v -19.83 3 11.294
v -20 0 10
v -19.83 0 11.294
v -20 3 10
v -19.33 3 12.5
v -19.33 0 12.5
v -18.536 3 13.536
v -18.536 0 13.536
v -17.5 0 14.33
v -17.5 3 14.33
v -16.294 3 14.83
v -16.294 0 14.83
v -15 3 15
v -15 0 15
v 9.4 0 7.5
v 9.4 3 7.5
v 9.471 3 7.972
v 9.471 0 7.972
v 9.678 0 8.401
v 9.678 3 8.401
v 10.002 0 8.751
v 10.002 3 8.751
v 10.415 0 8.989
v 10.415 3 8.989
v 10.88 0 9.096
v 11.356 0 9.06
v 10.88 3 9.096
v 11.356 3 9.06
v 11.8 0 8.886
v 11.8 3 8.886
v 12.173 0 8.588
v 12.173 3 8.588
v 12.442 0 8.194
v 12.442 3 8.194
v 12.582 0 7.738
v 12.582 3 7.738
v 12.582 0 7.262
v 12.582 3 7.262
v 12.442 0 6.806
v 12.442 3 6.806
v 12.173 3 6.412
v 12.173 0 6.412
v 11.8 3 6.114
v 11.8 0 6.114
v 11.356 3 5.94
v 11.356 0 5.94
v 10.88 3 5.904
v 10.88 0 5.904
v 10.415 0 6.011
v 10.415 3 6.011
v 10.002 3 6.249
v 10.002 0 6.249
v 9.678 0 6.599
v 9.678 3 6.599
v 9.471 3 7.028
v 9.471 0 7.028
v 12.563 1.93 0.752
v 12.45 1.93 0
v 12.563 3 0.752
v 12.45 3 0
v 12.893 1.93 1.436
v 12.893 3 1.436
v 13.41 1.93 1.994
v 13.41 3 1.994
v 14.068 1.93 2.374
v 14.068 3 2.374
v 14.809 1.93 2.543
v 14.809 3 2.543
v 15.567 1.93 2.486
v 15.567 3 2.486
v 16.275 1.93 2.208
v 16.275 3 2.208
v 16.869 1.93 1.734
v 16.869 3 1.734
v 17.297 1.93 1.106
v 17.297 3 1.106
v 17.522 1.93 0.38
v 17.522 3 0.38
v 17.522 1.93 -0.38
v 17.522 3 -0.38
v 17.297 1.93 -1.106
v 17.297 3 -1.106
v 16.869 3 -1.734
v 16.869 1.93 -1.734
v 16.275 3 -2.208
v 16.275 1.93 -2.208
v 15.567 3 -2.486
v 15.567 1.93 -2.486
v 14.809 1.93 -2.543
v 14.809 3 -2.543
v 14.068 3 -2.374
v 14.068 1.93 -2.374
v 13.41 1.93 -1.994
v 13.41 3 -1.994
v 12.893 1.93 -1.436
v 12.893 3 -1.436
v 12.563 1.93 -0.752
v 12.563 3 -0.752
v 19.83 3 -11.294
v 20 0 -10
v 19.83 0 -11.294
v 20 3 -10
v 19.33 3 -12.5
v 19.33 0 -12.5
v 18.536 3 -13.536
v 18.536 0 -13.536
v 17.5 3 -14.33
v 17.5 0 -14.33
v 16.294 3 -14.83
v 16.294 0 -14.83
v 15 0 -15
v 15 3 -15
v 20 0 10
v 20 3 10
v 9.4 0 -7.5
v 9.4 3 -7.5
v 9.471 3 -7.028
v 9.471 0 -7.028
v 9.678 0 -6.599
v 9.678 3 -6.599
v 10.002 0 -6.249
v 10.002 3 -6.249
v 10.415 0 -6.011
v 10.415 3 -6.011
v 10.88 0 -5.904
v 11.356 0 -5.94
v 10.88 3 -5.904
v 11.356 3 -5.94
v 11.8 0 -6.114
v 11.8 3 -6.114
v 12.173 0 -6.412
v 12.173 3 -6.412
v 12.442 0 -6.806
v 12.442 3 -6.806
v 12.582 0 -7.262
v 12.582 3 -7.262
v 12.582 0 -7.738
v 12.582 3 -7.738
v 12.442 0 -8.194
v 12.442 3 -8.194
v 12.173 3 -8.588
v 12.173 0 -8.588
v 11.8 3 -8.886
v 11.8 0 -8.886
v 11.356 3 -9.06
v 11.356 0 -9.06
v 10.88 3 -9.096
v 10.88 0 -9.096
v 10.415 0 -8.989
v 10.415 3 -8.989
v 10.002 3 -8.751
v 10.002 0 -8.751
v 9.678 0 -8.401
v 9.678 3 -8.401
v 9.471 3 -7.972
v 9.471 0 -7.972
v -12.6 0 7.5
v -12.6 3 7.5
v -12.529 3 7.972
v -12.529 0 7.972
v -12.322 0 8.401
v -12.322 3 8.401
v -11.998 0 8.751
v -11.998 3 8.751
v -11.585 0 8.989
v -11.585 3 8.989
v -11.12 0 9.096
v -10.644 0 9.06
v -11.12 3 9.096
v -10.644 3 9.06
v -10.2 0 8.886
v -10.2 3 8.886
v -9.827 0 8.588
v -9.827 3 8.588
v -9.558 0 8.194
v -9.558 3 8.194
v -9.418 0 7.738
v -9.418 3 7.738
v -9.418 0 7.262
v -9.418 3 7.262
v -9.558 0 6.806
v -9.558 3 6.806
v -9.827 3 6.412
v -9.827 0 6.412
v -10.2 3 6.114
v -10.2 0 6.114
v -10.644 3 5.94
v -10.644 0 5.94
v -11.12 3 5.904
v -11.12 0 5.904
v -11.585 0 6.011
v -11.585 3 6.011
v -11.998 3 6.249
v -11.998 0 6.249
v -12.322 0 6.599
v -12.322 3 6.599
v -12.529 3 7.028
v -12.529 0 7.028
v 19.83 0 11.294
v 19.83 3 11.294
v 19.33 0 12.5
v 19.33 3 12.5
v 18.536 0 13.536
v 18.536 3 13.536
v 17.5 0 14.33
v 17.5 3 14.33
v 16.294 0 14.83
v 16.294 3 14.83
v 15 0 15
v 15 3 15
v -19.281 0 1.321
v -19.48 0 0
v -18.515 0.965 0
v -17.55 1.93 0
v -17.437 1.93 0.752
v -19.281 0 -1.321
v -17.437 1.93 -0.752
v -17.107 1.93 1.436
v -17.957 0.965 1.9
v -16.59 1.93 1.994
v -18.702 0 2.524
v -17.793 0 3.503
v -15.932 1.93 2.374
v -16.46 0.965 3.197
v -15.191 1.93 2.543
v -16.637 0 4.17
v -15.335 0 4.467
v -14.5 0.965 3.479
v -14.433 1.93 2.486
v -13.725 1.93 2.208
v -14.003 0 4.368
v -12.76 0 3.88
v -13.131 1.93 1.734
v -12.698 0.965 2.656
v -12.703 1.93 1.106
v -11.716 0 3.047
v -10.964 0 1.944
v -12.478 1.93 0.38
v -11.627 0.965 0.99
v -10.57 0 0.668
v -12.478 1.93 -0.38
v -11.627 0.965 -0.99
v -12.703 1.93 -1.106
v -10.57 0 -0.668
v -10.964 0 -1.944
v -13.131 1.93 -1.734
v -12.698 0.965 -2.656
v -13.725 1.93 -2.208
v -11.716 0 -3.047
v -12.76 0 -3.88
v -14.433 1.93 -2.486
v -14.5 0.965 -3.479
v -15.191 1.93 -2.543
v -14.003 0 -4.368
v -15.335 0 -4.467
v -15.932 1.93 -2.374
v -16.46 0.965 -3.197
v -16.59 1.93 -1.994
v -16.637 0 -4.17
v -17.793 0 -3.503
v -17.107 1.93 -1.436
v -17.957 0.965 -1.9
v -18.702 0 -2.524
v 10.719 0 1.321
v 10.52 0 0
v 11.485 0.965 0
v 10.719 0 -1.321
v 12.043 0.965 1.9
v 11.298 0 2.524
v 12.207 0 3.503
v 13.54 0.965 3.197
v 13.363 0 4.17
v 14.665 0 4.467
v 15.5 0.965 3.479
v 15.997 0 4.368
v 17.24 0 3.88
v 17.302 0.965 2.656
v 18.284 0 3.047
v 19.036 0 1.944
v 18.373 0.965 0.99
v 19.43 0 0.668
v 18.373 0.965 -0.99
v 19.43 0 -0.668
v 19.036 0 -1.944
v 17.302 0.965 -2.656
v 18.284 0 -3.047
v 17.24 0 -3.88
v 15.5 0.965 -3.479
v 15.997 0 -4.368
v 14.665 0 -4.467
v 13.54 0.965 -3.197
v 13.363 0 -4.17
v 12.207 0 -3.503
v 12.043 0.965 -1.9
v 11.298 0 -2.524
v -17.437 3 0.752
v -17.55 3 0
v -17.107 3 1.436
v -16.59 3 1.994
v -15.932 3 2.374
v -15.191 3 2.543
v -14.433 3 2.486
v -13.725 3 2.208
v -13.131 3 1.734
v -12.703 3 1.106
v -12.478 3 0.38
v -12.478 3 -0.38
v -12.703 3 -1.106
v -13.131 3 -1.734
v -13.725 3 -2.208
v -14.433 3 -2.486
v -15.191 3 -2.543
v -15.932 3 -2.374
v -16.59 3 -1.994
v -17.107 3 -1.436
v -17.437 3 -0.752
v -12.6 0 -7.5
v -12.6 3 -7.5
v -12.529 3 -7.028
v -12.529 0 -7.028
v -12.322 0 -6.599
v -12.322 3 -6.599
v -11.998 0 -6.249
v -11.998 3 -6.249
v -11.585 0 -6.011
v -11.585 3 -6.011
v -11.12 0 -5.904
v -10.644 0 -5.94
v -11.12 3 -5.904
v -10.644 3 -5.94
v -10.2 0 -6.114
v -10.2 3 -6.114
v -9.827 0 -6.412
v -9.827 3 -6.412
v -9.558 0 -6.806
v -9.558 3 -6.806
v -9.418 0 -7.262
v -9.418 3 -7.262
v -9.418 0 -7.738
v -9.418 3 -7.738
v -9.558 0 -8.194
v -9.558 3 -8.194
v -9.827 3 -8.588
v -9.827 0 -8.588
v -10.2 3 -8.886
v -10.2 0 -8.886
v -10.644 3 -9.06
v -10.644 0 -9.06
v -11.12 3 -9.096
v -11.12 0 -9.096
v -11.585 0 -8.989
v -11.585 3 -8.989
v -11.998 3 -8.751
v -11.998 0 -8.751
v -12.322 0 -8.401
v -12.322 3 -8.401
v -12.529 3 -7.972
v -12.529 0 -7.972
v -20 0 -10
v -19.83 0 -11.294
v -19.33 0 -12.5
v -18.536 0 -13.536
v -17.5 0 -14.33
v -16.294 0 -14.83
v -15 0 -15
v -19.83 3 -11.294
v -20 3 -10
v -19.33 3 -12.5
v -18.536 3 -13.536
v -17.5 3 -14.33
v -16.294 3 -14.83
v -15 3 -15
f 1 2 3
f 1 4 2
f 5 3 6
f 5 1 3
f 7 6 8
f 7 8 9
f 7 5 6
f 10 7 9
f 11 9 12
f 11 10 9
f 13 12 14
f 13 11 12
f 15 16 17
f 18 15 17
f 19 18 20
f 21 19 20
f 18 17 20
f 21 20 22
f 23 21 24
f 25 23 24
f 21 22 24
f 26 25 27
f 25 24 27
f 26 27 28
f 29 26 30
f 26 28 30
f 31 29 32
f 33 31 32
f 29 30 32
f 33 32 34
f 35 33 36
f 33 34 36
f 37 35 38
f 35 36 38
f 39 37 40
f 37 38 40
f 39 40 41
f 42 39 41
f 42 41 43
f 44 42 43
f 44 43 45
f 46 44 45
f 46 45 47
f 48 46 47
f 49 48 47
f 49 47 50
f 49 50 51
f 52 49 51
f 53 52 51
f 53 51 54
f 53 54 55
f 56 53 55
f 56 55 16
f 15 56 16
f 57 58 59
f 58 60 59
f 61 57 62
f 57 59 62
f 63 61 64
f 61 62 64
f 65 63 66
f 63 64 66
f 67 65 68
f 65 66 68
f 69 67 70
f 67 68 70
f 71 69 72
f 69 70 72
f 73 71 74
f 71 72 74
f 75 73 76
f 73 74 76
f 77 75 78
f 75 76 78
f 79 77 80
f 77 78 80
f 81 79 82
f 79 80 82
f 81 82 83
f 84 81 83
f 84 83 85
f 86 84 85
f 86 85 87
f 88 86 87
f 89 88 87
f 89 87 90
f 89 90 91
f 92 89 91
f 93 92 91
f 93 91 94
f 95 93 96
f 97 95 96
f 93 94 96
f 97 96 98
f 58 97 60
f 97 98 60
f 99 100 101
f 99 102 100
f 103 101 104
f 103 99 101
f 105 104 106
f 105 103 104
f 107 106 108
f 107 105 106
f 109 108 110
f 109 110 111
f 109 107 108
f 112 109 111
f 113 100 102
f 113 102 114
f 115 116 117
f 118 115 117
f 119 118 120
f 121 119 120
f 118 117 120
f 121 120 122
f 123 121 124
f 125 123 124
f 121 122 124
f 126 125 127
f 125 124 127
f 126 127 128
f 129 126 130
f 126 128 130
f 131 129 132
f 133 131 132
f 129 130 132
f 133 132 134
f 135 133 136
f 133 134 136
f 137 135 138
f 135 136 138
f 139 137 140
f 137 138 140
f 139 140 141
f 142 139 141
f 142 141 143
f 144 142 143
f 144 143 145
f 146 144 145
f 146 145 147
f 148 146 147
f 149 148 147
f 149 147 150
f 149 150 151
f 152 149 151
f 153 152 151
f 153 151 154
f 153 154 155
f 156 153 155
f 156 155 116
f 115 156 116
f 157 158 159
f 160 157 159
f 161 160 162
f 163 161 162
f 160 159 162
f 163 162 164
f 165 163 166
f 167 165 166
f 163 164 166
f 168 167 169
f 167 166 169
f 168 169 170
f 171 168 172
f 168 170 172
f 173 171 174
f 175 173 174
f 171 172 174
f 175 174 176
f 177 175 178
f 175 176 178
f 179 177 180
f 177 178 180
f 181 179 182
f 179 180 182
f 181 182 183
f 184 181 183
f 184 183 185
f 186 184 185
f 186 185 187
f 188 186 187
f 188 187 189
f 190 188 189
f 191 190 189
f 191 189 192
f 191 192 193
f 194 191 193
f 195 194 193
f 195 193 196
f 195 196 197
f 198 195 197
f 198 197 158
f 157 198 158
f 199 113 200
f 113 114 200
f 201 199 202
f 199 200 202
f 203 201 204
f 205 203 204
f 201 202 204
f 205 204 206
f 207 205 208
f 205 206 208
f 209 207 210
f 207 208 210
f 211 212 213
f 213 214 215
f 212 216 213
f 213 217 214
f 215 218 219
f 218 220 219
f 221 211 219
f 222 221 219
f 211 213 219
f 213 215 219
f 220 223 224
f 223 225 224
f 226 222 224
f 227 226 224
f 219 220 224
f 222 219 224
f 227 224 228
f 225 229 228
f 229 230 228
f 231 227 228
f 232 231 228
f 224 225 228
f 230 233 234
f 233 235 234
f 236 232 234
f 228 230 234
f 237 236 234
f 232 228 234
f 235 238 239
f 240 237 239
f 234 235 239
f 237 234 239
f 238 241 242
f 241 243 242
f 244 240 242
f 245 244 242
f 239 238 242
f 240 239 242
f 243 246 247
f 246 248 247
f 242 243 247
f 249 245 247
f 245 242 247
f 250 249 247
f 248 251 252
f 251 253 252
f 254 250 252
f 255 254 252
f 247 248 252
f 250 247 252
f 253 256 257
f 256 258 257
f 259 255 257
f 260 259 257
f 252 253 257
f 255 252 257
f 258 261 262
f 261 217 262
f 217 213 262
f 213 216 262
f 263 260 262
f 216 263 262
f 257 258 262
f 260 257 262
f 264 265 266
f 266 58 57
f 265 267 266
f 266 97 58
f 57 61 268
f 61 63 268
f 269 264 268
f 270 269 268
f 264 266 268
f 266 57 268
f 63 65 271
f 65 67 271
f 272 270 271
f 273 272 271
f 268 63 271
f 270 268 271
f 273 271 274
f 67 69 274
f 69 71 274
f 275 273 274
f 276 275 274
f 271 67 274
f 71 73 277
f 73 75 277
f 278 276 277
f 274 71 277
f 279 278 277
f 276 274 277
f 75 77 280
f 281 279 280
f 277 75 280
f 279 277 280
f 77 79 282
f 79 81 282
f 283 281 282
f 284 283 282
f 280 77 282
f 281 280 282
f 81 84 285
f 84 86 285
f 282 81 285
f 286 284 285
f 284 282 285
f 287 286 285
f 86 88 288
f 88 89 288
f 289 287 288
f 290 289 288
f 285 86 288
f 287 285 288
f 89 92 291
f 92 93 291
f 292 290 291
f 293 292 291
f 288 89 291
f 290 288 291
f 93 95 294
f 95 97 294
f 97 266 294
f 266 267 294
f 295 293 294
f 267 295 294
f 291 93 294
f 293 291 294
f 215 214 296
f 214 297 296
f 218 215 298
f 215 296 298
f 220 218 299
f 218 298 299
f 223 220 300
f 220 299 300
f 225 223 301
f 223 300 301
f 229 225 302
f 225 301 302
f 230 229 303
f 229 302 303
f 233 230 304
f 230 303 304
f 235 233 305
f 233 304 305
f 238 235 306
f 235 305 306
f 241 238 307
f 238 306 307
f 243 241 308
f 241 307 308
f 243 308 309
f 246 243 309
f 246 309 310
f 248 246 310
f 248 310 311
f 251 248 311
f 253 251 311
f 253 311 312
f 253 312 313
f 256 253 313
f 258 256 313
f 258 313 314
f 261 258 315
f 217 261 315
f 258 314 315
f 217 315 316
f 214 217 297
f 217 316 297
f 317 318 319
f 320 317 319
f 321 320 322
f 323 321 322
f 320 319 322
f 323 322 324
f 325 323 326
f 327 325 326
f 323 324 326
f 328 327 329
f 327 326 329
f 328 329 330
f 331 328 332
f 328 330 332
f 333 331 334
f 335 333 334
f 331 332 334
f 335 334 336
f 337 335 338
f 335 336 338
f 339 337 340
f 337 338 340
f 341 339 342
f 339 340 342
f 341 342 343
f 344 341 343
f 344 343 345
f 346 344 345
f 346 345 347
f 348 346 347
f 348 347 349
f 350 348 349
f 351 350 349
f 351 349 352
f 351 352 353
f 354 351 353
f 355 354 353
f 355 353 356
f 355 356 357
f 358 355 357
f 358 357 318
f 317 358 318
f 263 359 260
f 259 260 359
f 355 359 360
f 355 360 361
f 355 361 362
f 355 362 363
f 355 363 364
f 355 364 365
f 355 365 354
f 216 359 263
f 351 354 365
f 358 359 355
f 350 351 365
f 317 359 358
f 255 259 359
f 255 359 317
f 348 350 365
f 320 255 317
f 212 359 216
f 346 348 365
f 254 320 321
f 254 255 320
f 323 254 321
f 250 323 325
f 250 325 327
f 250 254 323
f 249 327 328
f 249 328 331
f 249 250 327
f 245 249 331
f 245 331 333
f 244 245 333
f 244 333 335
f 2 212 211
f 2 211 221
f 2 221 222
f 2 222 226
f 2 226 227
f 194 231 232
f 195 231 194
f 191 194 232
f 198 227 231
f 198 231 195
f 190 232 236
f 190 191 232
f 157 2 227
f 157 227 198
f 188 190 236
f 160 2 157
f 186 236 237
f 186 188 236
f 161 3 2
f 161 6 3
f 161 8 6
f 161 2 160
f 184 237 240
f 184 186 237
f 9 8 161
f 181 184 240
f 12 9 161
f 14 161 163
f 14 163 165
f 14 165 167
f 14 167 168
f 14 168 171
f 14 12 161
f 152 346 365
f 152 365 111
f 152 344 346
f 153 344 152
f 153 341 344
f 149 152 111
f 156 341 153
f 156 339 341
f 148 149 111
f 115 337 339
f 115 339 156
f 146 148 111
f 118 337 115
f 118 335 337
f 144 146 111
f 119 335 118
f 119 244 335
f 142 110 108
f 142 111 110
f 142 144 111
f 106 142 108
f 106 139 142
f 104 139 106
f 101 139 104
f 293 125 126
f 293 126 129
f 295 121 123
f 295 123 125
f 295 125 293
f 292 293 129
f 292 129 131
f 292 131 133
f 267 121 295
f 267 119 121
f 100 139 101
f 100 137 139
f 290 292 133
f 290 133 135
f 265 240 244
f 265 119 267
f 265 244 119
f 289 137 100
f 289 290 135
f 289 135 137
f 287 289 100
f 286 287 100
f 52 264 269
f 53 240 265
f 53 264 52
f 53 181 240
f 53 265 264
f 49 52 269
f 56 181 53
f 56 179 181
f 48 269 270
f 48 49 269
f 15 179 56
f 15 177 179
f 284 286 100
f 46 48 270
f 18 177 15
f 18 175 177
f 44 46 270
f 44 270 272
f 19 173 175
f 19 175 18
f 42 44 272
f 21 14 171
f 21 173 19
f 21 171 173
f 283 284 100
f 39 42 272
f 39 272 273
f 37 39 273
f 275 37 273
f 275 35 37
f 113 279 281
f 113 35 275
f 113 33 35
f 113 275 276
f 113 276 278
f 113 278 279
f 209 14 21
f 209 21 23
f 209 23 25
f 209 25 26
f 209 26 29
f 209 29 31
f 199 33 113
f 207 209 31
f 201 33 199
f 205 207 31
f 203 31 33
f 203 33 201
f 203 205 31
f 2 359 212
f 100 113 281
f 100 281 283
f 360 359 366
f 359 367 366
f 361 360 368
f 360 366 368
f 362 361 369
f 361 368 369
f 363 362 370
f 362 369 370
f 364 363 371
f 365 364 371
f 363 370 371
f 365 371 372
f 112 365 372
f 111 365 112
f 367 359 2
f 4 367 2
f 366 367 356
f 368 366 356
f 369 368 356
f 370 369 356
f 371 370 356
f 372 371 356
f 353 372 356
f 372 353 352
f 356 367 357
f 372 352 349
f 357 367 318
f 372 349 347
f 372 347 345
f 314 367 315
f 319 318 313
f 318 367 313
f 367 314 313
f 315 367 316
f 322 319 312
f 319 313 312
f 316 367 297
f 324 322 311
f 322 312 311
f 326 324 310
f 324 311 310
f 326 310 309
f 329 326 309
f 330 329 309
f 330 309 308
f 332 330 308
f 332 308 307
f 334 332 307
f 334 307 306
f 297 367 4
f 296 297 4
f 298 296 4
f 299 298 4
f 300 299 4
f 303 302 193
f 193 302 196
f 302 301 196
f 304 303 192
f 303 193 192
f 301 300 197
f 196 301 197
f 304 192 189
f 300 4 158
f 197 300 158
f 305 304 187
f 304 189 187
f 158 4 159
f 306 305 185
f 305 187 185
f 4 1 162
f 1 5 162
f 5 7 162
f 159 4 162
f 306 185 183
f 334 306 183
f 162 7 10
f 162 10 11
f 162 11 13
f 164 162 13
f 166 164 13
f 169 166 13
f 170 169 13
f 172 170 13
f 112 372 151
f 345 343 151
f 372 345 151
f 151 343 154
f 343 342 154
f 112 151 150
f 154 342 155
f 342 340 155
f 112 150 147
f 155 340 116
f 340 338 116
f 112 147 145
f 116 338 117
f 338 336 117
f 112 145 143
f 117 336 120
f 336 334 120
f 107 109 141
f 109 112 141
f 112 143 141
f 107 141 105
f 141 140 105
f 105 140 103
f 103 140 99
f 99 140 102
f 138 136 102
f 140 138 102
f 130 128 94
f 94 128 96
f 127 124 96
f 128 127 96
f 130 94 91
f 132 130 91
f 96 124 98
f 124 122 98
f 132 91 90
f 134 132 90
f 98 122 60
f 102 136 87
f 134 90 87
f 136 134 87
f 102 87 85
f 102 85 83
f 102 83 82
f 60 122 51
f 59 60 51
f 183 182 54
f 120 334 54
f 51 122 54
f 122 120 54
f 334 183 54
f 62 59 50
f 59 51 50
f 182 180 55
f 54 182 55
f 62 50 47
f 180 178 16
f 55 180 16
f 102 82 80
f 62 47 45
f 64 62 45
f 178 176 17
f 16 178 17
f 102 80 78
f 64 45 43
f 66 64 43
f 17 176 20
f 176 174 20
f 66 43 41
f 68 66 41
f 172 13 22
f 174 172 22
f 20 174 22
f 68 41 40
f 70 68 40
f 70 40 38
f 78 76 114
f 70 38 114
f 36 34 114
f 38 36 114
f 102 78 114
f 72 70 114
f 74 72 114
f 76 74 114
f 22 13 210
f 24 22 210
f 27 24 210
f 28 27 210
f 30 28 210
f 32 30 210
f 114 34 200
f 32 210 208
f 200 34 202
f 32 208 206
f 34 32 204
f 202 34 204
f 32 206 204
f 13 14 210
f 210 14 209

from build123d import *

# Parameters (mm, degrees)
F0_W           = 40
F0_H           = 30
F1_DEPTH       = 3
F3_D           = 3.2
F4_D           = 5.1
F4_CSINK_D     = 8.96
F4_CSINK_ANGLE = 90
F5_R           = 5


with BuildPart() as f1:
    # F0 (on Front) → F1 (new body)
    with BuildSketch(Plane.XZ):
        Rectangle(F0_W, F0_H)
    extrude(amount=-F1_DEPTH)

    # F3 (through all)
    with Locations(Plane.XZ):
        with Locations((-11, 7.5), (-11, -7.5), (11, 7.5), (11, -7.5)):
            Hole(F3_D / 2)

    # F4 (through all)
    with Locations(Plane.XZ):
        with Locations((-15, 0), (15, 0)):
            CounterSinkHole(F4_D / 2, F4_CSINK_D / 2, counter_sink_angle=F4_CSINK_ANGLE)

    # F5
    f5_edges = [f1.edges().sort_by_distance(p)[0] for p in [
        (20, 1.5, 15),
        (20, 1.5, -15),
        (-20, 1.5, -15),
        (-20, 1.5, 15),
    ]]
    fillet(f5_edges, radius=F5_R)


solid = f1.part
